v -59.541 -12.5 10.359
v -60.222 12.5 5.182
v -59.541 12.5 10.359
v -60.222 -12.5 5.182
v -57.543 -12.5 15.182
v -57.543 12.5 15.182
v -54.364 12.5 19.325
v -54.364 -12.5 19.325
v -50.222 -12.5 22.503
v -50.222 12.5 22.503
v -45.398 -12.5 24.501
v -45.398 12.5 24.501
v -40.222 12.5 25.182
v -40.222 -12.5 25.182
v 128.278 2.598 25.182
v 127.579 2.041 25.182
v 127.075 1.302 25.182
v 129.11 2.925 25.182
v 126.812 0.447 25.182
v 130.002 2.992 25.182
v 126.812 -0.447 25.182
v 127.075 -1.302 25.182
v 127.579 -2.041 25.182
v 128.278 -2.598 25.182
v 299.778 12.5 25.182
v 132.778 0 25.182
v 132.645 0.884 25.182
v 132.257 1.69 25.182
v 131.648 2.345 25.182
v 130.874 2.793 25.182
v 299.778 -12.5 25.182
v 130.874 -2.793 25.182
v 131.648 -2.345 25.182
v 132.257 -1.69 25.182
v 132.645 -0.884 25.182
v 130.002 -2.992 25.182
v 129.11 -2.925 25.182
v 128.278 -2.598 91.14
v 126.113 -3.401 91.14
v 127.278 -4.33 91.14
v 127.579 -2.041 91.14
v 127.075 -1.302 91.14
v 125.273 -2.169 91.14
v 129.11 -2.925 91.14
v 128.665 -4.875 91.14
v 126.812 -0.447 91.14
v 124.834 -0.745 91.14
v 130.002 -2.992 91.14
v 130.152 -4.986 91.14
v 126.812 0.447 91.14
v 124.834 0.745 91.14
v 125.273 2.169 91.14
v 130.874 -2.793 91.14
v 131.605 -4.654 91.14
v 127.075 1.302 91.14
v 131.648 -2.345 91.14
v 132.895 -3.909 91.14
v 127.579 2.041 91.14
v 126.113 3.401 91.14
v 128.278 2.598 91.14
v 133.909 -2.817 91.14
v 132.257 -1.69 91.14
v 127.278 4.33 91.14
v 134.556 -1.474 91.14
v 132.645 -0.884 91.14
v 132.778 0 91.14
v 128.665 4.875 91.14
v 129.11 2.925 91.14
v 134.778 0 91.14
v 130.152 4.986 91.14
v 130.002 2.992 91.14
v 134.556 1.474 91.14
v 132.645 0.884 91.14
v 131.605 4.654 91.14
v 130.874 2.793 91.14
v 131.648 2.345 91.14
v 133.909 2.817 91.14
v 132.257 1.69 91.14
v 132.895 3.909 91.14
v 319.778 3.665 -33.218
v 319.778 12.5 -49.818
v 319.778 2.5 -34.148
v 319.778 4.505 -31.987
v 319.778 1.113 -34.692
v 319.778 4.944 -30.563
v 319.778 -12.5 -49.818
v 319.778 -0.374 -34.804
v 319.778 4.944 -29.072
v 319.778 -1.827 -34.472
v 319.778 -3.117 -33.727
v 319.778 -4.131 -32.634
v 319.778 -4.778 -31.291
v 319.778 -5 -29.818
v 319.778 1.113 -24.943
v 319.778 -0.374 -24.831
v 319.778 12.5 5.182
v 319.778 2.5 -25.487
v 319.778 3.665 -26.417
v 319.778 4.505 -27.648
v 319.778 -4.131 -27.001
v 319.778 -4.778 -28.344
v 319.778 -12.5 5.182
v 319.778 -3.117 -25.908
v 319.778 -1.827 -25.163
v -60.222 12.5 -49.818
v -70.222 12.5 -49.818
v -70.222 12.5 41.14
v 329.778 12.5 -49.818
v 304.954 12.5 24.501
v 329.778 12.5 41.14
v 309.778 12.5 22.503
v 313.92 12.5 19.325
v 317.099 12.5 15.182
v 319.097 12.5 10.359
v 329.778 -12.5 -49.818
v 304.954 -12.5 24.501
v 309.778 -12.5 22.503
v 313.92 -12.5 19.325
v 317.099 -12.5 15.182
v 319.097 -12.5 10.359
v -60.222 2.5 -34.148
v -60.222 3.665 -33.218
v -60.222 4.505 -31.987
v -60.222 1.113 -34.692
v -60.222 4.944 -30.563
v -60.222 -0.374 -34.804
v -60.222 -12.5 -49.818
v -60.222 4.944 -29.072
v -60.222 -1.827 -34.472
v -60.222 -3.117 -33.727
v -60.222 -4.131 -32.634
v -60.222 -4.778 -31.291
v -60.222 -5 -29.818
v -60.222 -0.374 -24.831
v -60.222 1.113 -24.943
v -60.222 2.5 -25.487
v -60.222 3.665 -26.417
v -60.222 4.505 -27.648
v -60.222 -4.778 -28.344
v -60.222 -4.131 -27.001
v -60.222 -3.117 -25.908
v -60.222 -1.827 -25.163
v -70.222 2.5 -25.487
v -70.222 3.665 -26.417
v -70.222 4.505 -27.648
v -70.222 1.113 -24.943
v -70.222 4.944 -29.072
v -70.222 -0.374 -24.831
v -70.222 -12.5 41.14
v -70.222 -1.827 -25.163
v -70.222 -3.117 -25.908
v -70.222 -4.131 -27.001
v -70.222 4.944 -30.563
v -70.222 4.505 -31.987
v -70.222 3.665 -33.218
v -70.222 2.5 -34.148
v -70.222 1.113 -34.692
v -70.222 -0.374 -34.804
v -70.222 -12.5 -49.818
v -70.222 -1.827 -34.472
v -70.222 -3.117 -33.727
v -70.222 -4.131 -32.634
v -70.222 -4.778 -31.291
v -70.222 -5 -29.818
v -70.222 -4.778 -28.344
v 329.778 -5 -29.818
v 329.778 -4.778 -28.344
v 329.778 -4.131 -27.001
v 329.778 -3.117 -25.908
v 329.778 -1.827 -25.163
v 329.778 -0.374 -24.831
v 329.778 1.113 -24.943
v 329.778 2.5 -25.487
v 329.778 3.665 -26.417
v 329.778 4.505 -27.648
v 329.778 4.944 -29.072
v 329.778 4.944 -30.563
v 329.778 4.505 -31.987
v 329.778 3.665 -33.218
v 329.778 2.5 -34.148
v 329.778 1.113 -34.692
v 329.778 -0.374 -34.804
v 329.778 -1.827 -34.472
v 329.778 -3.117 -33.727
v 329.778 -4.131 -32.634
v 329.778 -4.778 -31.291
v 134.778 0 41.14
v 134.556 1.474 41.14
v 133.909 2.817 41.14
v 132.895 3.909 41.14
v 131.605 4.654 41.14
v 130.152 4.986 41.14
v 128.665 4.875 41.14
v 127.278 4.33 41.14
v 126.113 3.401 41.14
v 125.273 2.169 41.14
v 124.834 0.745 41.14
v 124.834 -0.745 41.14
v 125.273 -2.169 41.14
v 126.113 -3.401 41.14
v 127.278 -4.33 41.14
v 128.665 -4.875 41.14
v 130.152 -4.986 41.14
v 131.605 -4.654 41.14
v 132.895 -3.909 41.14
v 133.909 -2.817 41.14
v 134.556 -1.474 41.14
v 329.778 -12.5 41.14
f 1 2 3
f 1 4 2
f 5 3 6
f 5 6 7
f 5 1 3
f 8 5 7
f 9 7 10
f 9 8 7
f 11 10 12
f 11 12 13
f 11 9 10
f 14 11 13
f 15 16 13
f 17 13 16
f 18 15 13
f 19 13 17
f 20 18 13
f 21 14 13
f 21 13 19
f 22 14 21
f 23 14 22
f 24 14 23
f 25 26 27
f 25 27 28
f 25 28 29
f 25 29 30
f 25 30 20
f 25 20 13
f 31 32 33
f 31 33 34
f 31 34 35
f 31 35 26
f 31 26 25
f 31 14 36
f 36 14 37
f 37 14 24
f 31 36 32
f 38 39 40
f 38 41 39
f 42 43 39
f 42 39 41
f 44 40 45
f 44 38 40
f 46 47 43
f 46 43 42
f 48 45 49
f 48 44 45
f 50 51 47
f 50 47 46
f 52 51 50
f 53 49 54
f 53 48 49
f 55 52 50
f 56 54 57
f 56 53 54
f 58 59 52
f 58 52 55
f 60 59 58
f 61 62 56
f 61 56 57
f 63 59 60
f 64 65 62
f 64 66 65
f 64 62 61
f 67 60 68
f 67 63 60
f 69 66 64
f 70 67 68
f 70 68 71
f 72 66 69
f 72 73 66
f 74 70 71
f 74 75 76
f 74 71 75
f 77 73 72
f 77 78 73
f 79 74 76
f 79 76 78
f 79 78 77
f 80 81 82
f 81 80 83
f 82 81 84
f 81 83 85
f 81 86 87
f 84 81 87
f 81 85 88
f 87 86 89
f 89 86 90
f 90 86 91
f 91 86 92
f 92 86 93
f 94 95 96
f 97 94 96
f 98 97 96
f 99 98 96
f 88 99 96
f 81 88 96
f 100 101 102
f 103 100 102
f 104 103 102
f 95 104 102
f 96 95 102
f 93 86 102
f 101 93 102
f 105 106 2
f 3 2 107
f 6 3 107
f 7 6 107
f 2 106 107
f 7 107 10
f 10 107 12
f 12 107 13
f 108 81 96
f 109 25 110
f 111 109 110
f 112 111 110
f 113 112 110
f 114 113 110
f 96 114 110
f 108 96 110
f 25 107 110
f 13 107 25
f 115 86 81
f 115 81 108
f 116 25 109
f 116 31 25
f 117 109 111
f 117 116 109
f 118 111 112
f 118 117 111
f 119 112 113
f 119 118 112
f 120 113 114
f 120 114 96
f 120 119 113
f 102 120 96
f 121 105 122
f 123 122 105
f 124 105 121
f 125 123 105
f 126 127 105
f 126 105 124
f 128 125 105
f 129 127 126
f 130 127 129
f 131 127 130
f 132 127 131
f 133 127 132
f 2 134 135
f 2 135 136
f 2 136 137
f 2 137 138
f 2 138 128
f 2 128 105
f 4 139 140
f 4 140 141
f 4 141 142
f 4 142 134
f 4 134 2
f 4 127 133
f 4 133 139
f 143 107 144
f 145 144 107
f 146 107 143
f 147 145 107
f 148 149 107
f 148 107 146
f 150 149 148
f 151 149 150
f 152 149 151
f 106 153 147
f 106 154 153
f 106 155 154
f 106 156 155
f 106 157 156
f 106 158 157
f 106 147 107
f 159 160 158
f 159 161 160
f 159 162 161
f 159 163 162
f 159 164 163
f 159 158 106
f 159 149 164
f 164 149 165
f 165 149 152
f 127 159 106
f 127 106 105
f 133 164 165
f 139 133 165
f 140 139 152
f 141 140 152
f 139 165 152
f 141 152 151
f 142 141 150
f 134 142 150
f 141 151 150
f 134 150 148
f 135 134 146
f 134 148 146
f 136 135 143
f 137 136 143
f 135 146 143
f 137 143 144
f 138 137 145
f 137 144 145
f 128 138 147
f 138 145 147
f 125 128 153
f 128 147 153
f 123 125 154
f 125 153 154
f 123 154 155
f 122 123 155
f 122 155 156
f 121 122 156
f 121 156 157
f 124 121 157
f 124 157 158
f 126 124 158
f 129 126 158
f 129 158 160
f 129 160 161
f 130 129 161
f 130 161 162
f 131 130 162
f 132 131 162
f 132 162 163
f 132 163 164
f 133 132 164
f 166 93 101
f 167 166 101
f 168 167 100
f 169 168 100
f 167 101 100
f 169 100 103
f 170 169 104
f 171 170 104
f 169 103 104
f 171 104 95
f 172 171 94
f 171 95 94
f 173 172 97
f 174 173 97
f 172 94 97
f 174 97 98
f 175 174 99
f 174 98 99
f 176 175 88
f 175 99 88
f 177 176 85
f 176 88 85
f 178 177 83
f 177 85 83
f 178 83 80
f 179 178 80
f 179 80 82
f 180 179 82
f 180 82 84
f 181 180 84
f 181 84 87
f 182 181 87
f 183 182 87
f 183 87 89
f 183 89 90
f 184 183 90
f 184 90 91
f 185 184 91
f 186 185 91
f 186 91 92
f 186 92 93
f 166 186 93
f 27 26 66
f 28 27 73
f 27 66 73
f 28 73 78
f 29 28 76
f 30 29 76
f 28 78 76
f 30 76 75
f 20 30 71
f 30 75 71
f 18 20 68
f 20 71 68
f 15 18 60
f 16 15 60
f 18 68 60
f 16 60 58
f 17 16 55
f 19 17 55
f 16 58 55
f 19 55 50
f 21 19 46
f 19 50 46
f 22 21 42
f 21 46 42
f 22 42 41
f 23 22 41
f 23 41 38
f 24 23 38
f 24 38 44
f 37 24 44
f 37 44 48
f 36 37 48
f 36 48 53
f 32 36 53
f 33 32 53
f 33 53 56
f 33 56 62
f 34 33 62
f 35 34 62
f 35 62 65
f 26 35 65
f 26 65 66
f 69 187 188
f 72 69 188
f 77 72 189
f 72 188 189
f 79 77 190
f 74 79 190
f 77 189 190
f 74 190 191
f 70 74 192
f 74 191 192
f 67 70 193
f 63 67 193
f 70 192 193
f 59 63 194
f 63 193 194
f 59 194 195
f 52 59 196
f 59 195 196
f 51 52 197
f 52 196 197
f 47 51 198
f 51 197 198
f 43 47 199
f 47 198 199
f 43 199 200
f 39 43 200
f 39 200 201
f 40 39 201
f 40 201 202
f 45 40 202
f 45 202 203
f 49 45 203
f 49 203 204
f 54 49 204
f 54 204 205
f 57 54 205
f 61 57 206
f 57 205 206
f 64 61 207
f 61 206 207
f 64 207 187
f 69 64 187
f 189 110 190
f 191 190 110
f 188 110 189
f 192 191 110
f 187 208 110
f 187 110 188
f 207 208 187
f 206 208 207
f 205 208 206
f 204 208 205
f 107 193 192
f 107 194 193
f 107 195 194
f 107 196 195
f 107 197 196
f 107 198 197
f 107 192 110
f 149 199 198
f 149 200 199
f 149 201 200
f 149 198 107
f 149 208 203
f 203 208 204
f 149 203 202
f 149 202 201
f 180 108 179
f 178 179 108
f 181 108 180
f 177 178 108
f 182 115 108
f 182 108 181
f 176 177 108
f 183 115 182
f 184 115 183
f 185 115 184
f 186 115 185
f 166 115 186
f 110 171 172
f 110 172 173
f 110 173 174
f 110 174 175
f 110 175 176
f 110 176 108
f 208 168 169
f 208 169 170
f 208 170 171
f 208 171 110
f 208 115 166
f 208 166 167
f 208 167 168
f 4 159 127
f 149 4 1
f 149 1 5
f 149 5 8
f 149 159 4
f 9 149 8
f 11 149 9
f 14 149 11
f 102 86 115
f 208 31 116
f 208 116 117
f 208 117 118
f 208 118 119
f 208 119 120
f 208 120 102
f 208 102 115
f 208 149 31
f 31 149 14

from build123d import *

# Parameters (mm, degrees)
F0_W     = 10
F0_H     = 75
F1_DEPTH = 12.5
F2_R     = 5
F3_DEPTH = 400.001
F4_R     = 5
F5_DEPTH = 50
F6_R     = 20
F7_R     = 3
F8_DEPTH = 140.9584442942


with BuildPart() as f1:
    # F0 (on Front) → F1 (new body, symmetric)
    with BuildSketch(Plane.XZ):
        Polygon((129.7779953739, 41.1399305532), (-70.2220046261, 41.1399305532), (-70.2220046261, 25.182486259), (-60.2220046261, 25.182486259), (129.7779953739, 25.182486259), align=None)
        Polygon((329.7779953739, 41.1399305532), (129.7779953739, 41.1399305532), (129.7779953739, 25.182486259), (319.7779953739, 25.182486259), (329.7779953739, 25.182486259), align=None)
        with Locations((-65.2220046261, -12.317513741)):
            Rectangle(F0_W, F0_H)
        with Locations((324.7779953739, -12.317513741)):
            Rectangle(F0_W, F0_H)
    extrude(amount=F1_DEPTH, both=True)

    # F2 (on face) → F3 (cut, through all)
    with BuildSketch(Plane(origin=(-70.2220046261, 0, 0), x_dir=(0, -1, 0), z_dir=(-1, 0, 0))):
        with Locations((0, -29.817513741)):
            Circle(F2_R)
    extrude(amount=-F3_DEPTH, mode=Mode.SUBTRACT)

    # F4 (on face) → F5 (join)
    with BuildSketch(Plane.XY.offset(41.1399305532)):
        with Locations((129.7779953739, 0)):
            Circle(F4_R)
    extrude(amount=F5_DEPTH)

    # F6
    f6_edges = [f1.edges().sort_by_distance(p)[0] for p in [
        (-60.222005, 0, 25.182486),
        (319.777995, 0, 25.182486),
    ]]
    fillet(f6_edges, radius=F6_R)

    # F7 (on face) → F8 (cut, through all)
    with BuildSketch(Plane.XY.offset(91.1399305532)):
        with Locations((129.7779953739, 0)):
            Circle(F7_R)
    extrude(amount=-F8_DEPTH, mode=Mode.SUBTRACT)


solid = f1.part
